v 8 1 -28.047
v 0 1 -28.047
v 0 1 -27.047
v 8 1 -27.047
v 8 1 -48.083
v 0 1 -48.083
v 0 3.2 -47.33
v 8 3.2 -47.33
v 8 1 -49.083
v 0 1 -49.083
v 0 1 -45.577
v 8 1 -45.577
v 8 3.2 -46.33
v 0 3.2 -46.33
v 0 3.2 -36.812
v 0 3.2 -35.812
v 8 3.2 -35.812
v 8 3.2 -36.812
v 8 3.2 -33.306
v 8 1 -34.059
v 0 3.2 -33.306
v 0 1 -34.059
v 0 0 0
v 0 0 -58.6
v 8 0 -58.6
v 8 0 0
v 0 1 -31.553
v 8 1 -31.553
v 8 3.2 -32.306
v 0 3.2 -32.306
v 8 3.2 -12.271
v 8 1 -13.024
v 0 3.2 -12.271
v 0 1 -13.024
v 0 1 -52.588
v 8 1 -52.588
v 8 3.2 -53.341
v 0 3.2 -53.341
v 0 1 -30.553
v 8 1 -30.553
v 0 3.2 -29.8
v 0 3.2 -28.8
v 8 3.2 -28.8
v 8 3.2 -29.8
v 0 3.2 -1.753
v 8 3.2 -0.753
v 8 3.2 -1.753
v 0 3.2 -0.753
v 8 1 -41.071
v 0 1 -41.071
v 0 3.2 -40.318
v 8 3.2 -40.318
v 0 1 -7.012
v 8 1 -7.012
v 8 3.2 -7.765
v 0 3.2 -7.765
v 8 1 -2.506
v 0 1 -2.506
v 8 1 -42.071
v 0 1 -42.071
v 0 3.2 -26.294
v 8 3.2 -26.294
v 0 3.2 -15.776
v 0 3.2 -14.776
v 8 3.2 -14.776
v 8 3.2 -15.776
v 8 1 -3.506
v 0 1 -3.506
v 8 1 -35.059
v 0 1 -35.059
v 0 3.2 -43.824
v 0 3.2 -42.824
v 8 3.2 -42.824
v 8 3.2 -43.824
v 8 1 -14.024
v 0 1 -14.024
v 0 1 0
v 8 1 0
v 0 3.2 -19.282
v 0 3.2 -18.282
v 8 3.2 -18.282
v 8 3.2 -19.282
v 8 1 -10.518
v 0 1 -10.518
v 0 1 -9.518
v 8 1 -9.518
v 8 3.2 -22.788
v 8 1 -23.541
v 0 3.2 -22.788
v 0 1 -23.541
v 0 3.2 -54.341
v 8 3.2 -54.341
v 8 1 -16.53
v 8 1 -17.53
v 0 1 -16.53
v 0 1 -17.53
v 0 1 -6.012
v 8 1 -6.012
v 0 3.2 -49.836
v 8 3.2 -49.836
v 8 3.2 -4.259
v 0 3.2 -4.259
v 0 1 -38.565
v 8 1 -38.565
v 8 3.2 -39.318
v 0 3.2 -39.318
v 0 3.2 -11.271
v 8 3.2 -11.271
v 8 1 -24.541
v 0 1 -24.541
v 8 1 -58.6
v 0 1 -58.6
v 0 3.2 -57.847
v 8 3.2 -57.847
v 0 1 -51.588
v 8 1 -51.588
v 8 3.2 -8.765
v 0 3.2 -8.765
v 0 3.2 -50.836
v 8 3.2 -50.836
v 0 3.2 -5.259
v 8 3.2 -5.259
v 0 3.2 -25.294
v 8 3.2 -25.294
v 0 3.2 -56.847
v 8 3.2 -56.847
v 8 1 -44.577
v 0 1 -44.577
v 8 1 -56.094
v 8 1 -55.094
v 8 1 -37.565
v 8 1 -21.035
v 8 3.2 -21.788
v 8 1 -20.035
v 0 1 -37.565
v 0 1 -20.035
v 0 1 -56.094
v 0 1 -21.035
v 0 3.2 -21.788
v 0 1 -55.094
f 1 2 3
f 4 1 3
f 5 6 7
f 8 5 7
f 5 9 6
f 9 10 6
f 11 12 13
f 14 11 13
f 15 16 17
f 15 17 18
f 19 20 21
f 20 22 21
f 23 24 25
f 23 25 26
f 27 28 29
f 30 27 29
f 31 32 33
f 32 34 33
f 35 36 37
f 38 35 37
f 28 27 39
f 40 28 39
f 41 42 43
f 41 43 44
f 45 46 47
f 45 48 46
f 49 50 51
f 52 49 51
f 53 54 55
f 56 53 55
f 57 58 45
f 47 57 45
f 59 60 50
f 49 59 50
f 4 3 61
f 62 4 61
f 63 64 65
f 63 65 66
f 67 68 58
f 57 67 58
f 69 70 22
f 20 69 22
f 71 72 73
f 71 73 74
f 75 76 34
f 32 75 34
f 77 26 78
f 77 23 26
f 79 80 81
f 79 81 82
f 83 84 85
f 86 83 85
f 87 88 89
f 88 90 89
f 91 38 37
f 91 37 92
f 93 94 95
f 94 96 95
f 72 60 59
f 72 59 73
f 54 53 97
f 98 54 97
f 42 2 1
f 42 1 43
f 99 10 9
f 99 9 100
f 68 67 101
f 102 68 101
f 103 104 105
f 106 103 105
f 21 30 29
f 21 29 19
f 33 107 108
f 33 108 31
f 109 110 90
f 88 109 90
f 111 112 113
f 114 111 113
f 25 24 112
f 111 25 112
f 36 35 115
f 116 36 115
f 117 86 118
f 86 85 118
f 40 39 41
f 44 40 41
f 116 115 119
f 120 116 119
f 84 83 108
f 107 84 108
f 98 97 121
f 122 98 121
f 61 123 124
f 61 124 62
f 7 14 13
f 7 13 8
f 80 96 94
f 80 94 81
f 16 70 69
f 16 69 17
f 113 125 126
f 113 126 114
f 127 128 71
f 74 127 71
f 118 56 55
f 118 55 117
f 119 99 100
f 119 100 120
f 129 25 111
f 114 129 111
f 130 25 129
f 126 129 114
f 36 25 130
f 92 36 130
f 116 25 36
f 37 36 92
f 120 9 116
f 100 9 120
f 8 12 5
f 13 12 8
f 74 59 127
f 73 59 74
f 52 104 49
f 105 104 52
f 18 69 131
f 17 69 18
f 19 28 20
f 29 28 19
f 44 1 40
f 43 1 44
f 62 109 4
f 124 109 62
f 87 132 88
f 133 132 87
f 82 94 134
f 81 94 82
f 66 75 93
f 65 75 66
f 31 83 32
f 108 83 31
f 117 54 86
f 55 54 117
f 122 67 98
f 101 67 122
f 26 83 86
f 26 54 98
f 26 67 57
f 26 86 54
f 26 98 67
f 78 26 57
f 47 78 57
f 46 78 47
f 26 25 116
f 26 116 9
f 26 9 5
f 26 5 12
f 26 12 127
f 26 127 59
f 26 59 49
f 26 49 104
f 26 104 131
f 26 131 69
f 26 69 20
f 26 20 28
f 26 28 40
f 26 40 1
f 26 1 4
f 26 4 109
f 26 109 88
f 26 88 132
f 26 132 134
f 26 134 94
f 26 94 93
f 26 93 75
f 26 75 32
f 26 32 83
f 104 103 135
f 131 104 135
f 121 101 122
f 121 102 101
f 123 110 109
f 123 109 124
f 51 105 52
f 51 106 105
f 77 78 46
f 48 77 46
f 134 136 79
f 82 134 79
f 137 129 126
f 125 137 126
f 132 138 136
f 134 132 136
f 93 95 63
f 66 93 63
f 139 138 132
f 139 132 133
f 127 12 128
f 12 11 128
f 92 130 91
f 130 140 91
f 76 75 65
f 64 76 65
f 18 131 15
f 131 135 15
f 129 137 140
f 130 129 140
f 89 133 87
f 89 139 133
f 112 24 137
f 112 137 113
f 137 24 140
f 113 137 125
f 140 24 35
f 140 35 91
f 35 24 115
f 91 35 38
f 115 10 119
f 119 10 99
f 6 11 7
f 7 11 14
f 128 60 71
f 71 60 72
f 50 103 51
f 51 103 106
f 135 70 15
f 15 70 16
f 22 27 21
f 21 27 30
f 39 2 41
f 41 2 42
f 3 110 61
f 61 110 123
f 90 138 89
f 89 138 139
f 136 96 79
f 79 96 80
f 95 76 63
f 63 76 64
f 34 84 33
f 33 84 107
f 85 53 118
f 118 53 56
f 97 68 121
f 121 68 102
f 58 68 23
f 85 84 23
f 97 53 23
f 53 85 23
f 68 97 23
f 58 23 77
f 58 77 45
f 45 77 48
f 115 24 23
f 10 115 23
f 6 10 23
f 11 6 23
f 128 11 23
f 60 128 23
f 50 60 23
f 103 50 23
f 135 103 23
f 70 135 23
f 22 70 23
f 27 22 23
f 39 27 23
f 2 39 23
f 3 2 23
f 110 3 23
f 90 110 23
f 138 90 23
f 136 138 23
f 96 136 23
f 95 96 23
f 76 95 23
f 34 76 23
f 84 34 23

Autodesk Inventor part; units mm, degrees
ref_plane "YZ Plane" through (0, 0, 0) normal (1, 0, 0) x (0, 1, 0)
ref_plane "XZ Plane" through (0, 0, 0) normal (0, 1, 0) x (-1, 0, 0)
ref_plane "XY Plane" through (0, 0, 0) normal (0, 0, 1) x (1, 0, 0)
sketch "Sketch1" plane through (0, 0, 0) normal (1, 0, 0) x (0, 1, 0)
  line L0 (0, 0) -> (1, 0)
  line L1 (1, 0) -> (3.2, -0.7529)
  line L2 (3.2, -0.7529) -> (3.2, -1.2529)
  line L3 (3.2, -1.2529) -> (0, -1.2529)
  line L4 (0, -1.2529) -> (0, 0)
  line L5 (0, -2.5059) -> (1, -2.5059)
  line L6 (1, -2.5059) -> (3.2, -1.7529)
  line L7 (3.2, -1.7529) -> (3.2, -1.2529)
  line L8 (0, -1.2529) -> (0, -2.5059)
  line L9 (1, -2.5059) -> (1, -3.0059)
  line L10 (1, -3.0059) -> (0, -3.0059)
  line L11 (0, -3.0059) -> (0, -2.5059)
  line L12 (0, -6.0118) -> (1, -6.0118)
  line L13 (1, -6.0118) -> (3.2, -5.2588)
  line L14 (3.2, -5.2588) -> (3.2, -4.7588)
  line L15 (0, -4.7588) -> (0, -6.0118)
  line L16 (3.2, -4.2588) -> (3.2, -4.7588)
  line L17 (1, -3.5059) -> (3.2, -4.2588)
  line L18 (0, -4.7588) -> (0, -3.5059)
  line L19 (1, -3.5059) -> (1, -3.0059)
  line L20 (0, -3.0059) -> (0, -3.5059)
  line L21 (1, -2.5059) -> (1, 0)
  dimension "d1" = 1
  dimension "d2" = 1
  dimension "d3" = 1
  dimension "d4" = 2.2
  dimension "d10" = 3.5059
extrude "Extrusion2" add sketch "Sketch1" along normal blind 8 contours L0 L21 L3 L4 | L3 L21 L5 L8 | L5 L9 L10 L11 | L10 L19 L17 L16 L14 L13 L12 L15 L18 L20
extrude "Extrusion3" add sketch "Sketch1" along normal up to surface (8 mm away) contours L1 L2 L3 L21 | L3 L7 L6 L21
pattern_linear "Rectangular Pattern1" count 16 spacing 3.5059 along (0, 0, -1) of "Extrusion2"
equation "\"d15\" = d10"
properties part number "bolt-rack"
